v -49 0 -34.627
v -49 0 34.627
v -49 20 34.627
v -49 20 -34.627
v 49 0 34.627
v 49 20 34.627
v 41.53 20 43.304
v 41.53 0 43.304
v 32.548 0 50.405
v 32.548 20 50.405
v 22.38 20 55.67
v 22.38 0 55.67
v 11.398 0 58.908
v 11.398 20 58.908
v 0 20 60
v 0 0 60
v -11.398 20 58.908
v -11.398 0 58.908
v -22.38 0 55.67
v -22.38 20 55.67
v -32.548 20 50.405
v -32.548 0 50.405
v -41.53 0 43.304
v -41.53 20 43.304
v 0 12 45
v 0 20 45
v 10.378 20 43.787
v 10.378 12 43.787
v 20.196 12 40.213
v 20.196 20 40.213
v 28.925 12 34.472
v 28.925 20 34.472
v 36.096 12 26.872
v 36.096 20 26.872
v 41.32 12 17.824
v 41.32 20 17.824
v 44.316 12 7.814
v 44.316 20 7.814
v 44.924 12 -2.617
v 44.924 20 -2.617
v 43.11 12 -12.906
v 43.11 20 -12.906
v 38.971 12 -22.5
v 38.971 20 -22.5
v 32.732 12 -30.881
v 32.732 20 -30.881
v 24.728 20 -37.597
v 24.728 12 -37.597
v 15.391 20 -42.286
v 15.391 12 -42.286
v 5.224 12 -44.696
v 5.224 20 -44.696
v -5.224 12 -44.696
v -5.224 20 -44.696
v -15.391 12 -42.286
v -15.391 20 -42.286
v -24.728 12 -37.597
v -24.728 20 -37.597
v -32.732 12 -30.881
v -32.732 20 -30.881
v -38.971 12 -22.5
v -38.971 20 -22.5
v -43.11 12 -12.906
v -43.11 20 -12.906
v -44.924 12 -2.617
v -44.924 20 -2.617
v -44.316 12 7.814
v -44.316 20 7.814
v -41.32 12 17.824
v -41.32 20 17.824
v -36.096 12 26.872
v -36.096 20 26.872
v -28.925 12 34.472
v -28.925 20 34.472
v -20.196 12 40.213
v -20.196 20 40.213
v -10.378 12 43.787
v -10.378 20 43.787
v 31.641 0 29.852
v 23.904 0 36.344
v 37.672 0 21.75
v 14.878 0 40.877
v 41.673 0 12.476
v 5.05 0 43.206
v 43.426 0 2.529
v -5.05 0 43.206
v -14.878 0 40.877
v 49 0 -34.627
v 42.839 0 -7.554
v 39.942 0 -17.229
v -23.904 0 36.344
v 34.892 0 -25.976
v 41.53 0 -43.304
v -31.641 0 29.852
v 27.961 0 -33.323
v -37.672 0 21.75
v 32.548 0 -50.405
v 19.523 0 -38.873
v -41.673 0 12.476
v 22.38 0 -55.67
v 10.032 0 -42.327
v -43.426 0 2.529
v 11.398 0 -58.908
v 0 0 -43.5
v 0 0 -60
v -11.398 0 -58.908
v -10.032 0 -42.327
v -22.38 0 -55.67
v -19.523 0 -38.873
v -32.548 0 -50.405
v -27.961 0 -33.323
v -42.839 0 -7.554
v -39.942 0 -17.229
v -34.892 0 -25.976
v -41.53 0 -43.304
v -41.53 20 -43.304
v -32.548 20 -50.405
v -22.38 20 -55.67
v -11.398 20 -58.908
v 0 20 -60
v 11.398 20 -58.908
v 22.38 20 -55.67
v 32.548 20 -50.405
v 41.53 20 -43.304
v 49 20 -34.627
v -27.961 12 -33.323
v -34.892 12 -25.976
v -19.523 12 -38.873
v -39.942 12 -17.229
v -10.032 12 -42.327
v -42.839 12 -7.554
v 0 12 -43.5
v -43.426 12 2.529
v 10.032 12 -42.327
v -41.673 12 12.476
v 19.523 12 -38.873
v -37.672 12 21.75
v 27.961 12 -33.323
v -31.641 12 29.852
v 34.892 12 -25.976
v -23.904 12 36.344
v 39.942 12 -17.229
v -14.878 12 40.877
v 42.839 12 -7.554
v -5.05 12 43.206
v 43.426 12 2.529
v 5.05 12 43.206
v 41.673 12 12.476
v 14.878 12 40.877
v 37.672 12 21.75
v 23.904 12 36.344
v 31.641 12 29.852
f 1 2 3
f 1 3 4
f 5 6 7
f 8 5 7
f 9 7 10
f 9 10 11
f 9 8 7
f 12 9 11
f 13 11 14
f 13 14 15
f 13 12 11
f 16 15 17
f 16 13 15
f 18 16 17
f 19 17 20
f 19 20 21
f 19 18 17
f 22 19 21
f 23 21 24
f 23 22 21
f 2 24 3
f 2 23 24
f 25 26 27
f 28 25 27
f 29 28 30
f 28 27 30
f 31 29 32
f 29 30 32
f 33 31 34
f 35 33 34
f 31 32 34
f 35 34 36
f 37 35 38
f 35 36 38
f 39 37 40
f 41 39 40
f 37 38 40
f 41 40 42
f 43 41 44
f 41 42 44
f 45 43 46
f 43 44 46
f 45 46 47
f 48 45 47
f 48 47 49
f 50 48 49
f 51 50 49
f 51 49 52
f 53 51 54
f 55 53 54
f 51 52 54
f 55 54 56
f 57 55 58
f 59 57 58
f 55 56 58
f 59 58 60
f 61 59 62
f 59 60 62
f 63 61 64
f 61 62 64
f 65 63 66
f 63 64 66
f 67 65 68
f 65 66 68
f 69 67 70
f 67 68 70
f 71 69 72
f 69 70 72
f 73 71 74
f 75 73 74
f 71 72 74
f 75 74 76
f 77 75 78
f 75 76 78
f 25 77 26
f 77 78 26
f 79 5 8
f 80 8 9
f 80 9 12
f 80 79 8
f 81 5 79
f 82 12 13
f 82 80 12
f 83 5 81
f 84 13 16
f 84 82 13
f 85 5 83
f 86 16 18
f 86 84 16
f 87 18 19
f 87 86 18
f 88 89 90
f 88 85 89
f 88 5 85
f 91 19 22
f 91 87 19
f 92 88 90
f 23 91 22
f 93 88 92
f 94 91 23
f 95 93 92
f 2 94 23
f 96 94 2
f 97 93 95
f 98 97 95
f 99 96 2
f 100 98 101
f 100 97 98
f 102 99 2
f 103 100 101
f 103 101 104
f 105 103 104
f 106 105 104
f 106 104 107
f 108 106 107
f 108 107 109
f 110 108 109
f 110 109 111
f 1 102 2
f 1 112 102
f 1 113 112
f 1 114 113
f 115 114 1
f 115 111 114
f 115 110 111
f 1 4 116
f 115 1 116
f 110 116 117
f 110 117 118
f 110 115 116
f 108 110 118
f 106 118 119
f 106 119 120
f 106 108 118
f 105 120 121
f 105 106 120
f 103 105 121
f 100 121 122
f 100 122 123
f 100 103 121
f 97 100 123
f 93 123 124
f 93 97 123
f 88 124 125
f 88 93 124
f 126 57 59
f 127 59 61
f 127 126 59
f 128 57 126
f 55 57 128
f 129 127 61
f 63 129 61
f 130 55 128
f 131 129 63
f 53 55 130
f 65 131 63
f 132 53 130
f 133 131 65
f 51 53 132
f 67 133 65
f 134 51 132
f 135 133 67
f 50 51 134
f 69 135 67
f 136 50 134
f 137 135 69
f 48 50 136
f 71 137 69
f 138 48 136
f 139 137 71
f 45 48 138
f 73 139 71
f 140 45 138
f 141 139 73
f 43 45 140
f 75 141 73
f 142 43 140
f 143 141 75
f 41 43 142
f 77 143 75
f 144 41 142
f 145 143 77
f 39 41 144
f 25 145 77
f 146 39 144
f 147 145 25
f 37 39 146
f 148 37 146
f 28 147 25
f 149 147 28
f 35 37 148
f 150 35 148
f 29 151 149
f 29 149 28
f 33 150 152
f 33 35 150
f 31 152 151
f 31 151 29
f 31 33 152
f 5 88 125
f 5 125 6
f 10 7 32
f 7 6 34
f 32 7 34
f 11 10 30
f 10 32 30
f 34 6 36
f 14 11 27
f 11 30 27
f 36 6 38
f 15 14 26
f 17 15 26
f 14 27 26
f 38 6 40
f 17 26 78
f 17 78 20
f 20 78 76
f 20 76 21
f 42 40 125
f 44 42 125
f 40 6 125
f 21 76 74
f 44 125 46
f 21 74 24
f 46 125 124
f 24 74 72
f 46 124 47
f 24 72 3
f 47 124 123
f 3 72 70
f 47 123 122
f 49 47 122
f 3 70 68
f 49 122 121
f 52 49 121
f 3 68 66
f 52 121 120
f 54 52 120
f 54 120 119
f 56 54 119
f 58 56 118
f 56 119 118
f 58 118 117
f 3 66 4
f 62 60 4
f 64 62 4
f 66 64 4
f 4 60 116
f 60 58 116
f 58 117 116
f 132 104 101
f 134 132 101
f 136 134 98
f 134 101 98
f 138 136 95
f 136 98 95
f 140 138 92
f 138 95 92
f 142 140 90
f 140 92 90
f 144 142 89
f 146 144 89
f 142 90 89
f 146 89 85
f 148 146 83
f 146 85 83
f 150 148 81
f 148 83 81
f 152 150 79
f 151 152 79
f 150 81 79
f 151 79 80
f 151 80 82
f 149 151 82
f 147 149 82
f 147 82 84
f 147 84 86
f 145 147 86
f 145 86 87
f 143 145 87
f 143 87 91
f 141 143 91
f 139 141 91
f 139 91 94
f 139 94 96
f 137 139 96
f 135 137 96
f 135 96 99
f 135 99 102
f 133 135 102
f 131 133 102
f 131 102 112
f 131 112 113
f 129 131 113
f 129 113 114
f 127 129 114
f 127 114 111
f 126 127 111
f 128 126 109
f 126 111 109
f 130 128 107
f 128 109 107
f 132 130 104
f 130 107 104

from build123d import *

# Parameters (mm, degrees)
BOSS_EXTRUDE1_DEPTH = 20
SKETCH2_R           = 43.5
CUT_EXTRUDE2_DEPTH  = 81.006249756
SKETCH3_R           = 45
CUT_EXTRUDE3_DEPTH  = 8


with BuildPart() as part:
    # Sketch1 → Boss-Extrude1 (new body)
    with BuildSketch(Plane(origin=(0, 0, 0), x_dir=(1, 0, 0), z_dir=(0, 1, 0))):
        with BuildLine():
            Line((-49, -34.626579386), (-49, 34.626579386))
            ThreePointArc((-49, 34.626579386), (0, 60), (49, 34.626579386))
            Line((49, 34.626579386), (49, -34.626579386))
            ThreePointArc((49, -34.626579386), (0, -60), (-49, -34.626579386))
        make_face()
    extrude(amount=BOSS_EXTRUDE1_DEPTH)

    # Sketch2 → Cut-Extrude2 (cut, through all)
    with BuildSketch(Plane.XZ):
        with Locations(Location((0, 0, 0), (0, 0, 270))):
            Circle(SKETCH2_R)
    extrude(amount=-CUT_EXTRUDE2_DEPTH, mode=Mode.SUBTRACT)

    # Sketch3 → Cut-Extrude3 (cut)
    with BuildSketch(Plane(origin=(0, 20, 0), x_dir=(1, 0, 0), z_dir=(0, 1, 0))):
        with Locations(Location((0, 0, 0), (0, 0, 270))):
            Circle(SKETCH3_R)
    extrude(amount=-CUT_EXTRUDE3_DEPTH, mode=Mode.SUBTRACT)


solid = part.part
